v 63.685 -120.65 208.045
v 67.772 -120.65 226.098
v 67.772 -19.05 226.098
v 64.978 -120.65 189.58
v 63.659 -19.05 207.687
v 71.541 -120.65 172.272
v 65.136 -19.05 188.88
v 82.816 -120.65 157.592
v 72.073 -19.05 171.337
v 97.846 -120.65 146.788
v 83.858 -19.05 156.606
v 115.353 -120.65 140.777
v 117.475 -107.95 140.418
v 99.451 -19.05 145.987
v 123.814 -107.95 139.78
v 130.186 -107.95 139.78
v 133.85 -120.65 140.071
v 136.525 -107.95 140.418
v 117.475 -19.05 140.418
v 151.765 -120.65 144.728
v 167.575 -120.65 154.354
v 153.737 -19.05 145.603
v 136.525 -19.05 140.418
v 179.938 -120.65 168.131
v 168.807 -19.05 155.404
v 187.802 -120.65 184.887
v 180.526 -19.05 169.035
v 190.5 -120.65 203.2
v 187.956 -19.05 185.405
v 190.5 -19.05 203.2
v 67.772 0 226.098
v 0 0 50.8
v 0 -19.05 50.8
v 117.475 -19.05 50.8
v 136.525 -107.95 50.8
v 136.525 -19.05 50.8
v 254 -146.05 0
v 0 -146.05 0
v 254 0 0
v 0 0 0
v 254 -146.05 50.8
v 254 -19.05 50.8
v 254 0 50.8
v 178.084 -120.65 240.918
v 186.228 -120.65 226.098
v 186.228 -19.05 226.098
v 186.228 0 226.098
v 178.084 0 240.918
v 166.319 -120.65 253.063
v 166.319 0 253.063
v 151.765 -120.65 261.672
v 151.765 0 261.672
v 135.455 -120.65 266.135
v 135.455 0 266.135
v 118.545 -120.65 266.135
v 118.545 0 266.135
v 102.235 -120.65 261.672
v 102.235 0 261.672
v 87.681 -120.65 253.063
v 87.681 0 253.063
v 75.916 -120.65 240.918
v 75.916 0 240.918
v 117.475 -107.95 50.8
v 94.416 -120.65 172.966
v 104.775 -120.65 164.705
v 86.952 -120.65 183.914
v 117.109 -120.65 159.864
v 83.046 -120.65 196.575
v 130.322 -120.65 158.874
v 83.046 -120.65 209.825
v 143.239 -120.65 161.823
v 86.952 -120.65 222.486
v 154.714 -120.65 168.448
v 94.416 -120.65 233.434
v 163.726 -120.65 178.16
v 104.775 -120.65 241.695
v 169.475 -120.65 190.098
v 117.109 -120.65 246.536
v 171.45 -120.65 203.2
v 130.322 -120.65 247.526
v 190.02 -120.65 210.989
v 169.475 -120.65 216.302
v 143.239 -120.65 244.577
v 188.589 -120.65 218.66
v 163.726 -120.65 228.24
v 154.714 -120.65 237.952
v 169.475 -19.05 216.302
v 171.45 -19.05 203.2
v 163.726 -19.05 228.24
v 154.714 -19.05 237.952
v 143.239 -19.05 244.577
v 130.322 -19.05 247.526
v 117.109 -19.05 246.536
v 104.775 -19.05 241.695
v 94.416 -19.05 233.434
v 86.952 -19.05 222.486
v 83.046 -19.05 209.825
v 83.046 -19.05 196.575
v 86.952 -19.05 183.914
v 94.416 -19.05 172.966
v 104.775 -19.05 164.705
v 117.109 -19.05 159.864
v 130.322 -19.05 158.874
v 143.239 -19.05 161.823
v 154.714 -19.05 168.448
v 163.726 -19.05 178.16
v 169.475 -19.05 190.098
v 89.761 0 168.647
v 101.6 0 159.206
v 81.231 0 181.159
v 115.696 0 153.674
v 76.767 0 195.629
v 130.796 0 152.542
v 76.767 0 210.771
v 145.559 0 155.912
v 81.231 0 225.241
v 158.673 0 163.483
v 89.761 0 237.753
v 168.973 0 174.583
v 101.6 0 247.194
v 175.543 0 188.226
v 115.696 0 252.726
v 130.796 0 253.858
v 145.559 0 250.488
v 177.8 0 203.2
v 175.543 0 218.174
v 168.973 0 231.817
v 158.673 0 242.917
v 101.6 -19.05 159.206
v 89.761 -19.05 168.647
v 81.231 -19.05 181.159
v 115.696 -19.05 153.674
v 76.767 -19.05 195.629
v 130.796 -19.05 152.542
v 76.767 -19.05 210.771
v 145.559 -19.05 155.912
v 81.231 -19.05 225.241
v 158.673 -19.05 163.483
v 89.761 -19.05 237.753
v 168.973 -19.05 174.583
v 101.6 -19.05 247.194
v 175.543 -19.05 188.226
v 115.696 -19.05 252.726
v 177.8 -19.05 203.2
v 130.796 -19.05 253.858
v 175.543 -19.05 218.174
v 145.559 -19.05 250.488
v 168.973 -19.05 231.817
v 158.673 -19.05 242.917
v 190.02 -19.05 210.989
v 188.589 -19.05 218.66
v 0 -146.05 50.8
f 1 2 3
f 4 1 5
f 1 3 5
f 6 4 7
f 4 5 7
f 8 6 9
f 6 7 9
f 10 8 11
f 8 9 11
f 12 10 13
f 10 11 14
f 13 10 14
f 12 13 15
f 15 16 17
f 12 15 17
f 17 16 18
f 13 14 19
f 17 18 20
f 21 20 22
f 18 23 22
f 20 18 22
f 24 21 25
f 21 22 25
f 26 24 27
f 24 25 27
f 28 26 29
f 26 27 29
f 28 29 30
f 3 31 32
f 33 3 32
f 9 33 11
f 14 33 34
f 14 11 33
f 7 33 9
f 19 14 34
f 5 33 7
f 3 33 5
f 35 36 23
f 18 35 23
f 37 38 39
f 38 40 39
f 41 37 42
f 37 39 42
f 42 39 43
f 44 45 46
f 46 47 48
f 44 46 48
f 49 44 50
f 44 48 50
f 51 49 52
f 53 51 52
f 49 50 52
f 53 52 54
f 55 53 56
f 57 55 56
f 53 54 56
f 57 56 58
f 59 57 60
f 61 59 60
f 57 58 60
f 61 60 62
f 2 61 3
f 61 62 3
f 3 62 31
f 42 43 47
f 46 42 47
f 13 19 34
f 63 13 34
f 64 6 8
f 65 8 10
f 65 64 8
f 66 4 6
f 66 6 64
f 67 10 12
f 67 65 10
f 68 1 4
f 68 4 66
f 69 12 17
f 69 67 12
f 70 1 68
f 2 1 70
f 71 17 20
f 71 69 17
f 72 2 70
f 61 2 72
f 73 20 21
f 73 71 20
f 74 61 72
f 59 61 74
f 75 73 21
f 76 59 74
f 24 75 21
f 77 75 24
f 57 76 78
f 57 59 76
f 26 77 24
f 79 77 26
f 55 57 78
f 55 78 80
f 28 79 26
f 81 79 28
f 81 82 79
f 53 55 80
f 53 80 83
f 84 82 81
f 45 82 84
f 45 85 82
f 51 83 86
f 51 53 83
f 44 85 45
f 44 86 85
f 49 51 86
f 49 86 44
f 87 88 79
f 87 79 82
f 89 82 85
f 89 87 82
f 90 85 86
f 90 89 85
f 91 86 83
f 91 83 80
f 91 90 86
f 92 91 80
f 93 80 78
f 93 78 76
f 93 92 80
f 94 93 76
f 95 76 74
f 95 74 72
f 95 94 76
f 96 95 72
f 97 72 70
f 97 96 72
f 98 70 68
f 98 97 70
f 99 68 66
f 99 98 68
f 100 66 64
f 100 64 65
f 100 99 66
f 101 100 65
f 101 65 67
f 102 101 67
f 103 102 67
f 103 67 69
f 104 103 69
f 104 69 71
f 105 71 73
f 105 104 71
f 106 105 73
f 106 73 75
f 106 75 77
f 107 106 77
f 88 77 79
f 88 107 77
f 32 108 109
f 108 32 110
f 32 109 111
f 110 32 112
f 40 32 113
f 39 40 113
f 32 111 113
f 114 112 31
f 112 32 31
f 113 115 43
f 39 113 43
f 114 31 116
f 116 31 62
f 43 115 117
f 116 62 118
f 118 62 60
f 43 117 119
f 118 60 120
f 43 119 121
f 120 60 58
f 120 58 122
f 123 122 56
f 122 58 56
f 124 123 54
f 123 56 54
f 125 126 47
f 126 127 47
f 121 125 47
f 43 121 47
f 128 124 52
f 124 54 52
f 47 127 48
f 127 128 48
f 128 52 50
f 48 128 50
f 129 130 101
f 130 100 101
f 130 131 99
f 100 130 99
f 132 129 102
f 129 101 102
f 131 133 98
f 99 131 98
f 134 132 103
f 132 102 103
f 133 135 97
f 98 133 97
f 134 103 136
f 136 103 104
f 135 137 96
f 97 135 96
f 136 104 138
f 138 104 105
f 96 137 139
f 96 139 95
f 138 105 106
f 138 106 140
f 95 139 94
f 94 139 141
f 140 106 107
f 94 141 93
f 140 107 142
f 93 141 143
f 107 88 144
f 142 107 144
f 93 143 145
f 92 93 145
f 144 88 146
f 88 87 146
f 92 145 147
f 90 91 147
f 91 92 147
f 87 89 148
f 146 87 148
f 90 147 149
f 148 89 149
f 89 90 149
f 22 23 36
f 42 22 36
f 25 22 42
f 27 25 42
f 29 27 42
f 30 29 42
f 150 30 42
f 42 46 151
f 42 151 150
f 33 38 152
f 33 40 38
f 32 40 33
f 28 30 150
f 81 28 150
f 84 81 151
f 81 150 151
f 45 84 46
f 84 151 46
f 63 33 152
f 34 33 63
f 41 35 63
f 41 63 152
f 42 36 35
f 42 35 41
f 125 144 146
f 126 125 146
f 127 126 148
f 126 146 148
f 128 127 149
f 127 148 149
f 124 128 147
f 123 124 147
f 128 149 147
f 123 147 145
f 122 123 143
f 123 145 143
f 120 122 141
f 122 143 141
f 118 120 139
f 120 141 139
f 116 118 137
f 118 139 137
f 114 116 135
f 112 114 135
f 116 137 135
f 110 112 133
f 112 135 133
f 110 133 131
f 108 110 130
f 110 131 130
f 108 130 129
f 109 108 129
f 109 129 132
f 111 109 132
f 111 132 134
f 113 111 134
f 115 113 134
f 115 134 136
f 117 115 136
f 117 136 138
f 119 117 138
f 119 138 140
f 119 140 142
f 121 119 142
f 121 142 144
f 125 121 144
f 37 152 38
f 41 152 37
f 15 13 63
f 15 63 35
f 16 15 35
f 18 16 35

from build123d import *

# Parameters (mm, degrees)
F1_DEPTH = 19.05
F2_R     = 44.45
F3_DEPTH = 101.6
F4_W     = 254
F4_H     = 50.8
F5_DEPTH = 127
F7_DEPTH = 88.9
F8_R     = 50.8
F9_DEPTH = 19.051


with BuildPart() as f1:
    # F0 (on Front) → F1 (new body)
    with BuildSketch(Plane.XZ):
        with BuildLine():
            Line((0, 50.8), (0, 0))
            Line((0, 0), (254, 0))
            Line((254, 0), (254, 50.8))
            Line((254, 50.8), (186.227747, 226.098122))
            ThreePointArc((186.227747, 226.098122), (127, 266.7), (67.772253, 226.098122))
            Line((67.772253, 226.098122), (0, 50.8))
        make_face()
    extrude(amount=F1_DEPTH)

    # F2 (on face) → F3 (join)
    with BuildSketch(Plane.XZ.offset(19.05)):
        with BuildLine():
            ThreePointArc((67.772253, 226.098122), (115.353368, 140.7772), (190.5, 203.2))
            ThreePointArc((190.5, 203.2), (189.4228, 214.846632), (186.227747, 226.098122))
            ThreePointArc((186.227747, 226.098122), (127, 266.7), (67.772253, 226.098122))
        make_face()
        with Locations((127, 203.2)):
            Circle(F2_R, mode=Mode.SUBTRACT)
    extrude(amount=F3_DEPTH)

    # F4 (on face) → F5 (join)
    with BuildSketch(Plane.XZ.offset(19.05)):
        with Locations((127, 25.4)):
            Rectangle(F4_W, F4_H)
    extrude(amount=F5_DEPTH)

    # F6 (on face) → F7 (join)
    with BuildSketch(Plane.XZ.offset(19.05)):
        with BuildLine():
            Line((117.475, 140.418439), (117.475, 50.8))
            Line((117.475, 50.8), (136.525, 50.8))
            Line((136.525, 50.8), (136.525, 140.418439))
            ThreePointArc((136.525, 140.418439), (127, 139.820783), (117.475, 140.418439))
        make_face()
    extrude(amount=F7_DEPTH)

    # F8 (on face) → F9 (cut, through all)
    with BuildSketch(Plane.XZ.offset(19.05)):
        with Locations((127, 203.2)):
            Circle(F8_R)
    extrude(amount=-F9_DEPTH, mode=Mode.SUBTRACT)


solid = f1.part
